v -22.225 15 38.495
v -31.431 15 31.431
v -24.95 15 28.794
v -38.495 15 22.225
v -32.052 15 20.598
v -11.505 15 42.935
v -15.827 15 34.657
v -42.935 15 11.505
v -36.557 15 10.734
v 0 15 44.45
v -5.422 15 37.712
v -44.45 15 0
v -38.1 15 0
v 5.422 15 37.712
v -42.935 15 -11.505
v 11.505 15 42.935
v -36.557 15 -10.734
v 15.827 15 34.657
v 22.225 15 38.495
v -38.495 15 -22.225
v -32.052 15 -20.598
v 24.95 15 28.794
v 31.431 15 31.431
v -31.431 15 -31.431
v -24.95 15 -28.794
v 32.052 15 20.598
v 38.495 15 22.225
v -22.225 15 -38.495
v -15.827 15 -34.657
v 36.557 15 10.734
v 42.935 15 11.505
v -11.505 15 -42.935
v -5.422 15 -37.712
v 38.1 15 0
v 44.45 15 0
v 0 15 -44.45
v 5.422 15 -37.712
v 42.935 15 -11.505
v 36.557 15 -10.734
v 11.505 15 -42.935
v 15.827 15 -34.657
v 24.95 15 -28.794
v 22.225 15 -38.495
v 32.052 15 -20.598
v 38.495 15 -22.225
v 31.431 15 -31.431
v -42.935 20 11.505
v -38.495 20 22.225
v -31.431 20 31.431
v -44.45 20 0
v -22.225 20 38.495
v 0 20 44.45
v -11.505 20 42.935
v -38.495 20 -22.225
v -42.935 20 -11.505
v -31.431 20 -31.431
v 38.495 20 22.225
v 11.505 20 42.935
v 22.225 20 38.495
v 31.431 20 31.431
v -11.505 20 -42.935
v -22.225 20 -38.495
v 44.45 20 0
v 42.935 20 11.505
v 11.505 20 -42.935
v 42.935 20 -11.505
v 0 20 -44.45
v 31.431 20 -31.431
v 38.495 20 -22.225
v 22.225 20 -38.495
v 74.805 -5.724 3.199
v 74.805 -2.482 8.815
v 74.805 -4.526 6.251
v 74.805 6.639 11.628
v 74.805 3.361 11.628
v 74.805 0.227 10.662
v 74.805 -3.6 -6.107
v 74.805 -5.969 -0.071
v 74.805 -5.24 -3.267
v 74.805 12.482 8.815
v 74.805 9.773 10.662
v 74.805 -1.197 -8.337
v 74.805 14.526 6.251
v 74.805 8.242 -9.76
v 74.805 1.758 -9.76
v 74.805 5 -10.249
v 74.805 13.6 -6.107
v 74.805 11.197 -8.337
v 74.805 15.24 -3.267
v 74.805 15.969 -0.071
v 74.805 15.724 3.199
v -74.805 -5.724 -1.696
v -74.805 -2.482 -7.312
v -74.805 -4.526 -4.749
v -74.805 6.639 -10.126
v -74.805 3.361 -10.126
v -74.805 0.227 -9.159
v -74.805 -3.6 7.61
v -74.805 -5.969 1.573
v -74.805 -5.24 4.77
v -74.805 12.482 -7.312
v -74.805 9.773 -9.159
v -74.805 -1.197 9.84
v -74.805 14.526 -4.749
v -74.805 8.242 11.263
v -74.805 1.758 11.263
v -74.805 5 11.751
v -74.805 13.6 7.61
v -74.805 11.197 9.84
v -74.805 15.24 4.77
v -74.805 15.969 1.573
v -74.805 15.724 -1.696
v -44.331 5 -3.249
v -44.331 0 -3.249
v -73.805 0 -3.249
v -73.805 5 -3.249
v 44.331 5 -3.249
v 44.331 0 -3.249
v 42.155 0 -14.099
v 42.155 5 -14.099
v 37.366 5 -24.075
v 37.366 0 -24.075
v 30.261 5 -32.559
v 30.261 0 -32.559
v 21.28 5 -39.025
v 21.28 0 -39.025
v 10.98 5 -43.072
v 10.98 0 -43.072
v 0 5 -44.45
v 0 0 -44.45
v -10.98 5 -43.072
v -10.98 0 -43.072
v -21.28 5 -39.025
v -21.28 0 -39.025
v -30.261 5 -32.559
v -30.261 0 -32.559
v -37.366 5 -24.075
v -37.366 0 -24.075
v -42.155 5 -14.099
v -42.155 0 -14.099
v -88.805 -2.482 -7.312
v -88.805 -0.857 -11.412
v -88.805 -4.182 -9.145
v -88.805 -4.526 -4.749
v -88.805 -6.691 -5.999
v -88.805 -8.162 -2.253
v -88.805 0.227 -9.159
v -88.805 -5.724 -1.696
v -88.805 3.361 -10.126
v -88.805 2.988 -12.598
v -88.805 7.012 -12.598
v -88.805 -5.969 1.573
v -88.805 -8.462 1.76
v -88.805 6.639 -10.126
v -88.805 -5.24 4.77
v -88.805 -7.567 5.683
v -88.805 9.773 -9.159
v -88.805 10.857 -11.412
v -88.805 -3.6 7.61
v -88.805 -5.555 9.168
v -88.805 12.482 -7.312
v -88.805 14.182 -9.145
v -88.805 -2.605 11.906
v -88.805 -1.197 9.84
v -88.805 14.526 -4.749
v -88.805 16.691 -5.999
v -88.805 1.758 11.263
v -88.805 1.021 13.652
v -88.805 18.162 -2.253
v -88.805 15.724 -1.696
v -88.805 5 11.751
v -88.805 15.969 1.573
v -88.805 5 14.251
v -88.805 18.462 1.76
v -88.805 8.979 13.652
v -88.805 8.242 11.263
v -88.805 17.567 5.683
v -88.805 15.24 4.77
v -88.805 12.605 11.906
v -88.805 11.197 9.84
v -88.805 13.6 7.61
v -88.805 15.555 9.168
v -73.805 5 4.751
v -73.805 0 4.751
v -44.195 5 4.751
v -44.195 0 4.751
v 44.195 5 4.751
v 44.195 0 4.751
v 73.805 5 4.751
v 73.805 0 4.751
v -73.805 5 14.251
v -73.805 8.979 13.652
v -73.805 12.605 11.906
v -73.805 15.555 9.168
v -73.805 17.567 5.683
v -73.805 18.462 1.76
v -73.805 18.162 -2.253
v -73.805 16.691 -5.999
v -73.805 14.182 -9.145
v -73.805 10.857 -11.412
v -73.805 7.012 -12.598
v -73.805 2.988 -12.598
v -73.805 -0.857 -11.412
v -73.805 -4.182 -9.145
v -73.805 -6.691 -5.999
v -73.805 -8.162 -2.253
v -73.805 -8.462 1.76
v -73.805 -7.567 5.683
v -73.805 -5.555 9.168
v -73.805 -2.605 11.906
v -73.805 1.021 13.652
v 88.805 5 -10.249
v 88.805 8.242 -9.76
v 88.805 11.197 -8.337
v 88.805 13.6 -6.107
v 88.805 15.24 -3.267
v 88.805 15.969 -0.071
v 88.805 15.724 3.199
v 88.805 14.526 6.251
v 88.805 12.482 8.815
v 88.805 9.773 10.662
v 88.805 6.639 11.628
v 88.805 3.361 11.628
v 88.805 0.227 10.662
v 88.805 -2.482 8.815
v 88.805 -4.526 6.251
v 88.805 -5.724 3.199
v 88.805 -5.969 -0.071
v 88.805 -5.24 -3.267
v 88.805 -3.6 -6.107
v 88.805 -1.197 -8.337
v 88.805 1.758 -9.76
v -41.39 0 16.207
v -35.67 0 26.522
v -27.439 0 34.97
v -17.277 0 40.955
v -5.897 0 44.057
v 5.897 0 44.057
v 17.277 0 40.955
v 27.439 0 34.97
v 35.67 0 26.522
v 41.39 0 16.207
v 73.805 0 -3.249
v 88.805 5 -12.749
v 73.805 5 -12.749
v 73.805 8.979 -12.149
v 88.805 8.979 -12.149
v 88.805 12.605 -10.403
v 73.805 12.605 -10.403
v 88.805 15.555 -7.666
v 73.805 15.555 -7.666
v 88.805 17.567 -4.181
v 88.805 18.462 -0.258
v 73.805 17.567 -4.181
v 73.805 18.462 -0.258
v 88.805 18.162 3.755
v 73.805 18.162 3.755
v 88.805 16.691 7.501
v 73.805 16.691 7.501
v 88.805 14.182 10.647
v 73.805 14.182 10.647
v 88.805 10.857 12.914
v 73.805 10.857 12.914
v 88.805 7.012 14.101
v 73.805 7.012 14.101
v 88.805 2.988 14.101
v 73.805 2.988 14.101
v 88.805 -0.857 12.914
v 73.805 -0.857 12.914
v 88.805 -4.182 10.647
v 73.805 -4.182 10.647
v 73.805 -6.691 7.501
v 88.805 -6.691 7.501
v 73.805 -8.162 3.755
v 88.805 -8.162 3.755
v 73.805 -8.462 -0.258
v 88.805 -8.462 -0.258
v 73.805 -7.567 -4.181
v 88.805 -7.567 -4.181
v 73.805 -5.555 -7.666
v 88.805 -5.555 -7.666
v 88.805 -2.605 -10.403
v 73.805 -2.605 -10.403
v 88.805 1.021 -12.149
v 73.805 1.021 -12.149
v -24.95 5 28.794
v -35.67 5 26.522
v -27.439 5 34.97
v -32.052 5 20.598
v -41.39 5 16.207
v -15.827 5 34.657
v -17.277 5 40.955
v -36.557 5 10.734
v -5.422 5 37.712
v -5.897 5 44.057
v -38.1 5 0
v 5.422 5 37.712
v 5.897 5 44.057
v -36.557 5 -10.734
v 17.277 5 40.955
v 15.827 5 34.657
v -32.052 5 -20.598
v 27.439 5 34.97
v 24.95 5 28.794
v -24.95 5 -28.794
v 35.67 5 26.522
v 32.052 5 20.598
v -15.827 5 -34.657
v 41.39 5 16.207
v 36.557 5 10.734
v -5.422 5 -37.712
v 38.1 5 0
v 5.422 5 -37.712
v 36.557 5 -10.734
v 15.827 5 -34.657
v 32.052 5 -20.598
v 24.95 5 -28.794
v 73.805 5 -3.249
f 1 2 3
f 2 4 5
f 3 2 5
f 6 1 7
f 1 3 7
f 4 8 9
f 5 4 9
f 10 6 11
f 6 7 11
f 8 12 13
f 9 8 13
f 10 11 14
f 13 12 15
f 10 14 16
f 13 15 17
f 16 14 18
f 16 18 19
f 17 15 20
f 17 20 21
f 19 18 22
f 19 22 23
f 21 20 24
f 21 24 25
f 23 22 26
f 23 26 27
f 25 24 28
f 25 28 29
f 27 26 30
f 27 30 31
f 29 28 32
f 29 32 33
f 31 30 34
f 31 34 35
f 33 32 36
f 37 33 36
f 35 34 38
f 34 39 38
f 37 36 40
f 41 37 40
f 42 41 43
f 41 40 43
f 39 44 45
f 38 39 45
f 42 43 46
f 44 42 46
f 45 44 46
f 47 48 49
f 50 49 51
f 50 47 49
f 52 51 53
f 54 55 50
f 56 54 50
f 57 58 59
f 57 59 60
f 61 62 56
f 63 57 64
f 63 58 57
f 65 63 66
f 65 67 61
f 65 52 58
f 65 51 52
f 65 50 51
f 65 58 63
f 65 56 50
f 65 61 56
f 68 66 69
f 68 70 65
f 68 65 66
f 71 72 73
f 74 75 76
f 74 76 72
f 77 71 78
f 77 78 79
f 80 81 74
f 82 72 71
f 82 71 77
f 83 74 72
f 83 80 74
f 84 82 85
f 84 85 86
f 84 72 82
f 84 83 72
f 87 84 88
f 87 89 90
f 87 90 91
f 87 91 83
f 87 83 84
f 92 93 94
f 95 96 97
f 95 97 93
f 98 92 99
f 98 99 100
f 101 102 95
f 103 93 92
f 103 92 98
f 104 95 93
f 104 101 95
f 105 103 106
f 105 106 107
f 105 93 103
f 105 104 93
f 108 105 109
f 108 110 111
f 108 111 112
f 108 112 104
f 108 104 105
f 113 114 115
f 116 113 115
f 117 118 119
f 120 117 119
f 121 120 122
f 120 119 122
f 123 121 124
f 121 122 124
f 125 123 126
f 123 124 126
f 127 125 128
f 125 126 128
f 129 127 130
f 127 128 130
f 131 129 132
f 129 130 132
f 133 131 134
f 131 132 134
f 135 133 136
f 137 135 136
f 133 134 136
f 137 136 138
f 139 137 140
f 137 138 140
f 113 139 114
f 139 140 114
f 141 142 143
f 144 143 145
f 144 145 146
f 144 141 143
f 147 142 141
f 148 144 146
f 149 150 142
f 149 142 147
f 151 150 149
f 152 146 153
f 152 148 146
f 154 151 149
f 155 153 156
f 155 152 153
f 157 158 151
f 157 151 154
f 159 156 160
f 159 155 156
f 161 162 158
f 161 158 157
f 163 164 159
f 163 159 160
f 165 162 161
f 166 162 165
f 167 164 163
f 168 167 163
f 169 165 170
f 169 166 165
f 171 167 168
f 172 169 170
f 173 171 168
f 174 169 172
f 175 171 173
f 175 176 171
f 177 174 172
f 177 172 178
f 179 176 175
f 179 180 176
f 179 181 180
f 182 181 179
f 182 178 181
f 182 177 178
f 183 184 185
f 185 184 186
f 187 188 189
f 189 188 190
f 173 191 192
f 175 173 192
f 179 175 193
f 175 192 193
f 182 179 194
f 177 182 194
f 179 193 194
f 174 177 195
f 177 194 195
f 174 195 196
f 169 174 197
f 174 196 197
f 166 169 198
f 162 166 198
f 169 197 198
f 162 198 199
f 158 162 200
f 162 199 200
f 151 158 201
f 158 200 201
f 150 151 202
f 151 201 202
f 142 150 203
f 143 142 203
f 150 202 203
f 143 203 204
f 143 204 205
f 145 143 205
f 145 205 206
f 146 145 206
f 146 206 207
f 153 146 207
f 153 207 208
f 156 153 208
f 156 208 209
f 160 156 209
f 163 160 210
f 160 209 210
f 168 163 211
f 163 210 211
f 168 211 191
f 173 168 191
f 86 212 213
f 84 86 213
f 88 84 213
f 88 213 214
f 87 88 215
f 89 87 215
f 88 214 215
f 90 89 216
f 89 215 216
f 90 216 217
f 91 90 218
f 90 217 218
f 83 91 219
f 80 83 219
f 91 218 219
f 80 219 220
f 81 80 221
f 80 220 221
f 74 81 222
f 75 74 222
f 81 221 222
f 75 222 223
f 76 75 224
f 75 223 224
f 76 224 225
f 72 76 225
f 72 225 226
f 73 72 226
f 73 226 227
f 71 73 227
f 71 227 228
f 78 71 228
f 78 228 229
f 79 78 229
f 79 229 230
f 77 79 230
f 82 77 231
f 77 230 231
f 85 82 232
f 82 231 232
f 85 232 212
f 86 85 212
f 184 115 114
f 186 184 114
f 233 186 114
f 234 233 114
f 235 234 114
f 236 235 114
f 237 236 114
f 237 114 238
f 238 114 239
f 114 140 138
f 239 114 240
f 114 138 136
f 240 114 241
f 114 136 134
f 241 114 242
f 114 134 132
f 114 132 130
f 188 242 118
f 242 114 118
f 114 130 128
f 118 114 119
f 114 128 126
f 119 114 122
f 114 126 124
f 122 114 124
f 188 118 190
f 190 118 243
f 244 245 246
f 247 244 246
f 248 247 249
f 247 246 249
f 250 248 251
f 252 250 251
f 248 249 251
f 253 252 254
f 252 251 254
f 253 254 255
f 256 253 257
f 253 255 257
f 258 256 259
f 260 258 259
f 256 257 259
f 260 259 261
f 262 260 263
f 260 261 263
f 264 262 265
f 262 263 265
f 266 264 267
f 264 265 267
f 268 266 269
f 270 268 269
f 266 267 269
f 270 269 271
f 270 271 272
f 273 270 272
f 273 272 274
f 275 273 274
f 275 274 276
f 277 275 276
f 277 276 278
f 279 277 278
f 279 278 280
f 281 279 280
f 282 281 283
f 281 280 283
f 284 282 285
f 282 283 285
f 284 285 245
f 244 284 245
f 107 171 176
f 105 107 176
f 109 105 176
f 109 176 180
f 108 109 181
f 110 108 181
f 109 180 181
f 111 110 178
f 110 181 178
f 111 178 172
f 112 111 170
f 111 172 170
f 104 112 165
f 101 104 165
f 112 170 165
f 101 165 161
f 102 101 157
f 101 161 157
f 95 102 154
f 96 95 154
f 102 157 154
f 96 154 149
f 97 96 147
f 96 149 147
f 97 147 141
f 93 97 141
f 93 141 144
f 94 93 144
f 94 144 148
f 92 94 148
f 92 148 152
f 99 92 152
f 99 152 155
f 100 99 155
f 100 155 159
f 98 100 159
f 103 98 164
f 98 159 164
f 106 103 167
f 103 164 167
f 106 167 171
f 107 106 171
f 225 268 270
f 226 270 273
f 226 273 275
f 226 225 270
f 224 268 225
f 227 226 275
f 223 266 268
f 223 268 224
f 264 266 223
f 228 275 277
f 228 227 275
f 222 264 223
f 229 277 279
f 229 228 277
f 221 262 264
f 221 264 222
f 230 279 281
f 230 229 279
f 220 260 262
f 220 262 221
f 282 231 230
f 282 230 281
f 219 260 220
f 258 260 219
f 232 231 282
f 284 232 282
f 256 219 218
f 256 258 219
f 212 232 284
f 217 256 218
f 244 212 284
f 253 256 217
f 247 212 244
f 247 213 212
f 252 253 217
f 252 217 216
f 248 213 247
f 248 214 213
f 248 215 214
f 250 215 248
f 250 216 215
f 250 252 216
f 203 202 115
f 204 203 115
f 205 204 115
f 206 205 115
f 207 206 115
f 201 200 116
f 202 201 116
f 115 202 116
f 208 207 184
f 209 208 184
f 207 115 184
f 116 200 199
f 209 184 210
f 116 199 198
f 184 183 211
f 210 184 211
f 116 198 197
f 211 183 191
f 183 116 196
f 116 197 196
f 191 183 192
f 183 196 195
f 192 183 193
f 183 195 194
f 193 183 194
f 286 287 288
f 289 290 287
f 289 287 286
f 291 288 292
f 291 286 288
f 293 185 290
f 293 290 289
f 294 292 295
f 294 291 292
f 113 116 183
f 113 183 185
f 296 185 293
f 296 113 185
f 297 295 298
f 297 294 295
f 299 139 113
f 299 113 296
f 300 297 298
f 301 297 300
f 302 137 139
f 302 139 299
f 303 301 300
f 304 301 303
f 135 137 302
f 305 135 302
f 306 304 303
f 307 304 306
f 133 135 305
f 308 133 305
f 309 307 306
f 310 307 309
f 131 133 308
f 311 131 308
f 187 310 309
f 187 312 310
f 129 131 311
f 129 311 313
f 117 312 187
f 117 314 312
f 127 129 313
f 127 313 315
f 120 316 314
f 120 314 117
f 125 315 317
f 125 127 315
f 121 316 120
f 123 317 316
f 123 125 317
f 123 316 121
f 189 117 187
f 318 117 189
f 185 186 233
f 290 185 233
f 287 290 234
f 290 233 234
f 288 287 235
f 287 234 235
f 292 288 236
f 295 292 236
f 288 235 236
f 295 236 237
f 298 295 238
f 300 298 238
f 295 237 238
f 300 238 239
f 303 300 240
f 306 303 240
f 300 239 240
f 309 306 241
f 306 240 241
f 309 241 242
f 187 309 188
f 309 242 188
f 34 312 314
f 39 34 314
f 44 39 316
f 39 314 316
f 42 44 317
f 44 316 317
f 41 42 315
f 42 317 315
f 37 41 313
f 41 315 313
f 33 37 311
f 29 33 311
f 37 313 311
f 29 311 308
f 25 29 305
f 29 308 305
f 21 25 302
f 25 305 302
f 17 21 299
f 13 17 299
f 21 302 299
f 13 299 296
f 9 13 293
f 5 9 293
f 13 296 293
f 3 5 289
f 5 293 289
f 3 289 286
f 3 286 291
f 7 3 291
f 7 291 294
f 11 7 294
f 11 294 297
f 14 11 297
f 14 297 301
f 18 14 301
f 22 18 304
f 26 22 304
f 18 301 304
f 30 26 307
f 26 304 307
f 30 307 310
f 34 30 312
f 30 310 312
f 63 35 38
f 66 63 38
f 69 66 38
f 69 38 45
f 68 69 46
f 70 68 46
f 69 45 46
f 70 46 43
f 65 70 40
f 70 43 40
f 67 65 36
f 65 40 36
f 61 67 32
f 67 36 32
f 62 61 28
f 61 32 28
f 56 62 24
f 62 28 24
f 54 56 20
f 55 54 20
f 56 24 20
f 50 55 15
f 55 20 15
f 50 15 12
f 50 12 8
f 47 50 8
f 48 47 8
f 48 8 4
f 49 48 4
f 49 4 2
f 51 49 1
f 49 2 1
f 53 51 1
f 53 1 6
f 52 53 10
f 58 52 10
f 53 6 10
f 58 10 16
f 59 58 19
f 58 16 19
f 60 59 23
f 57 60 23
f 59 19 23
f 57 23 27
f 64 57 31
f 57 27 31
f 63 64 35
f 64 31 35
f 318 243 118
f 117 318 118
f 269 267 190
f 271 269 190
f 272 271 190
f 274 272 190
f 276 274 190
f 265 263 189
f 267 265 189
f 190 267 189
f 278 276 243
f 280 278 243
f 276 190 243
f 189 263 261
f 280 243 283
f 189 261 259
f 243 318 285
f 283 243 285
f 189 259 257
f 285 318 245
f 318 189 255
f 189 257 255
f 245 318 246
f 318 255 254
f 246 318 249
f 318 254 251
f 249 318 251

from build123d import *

# Parameters (mm, degrees)
SKETCH1_R           = 44.45
BOSS_EXTRUDE1_DEPTH = 5
SKETCH2_R           = 38.1
BOSS_EXTRUDE2_DEPTH = 10
SKETCH3_R           = 44.45
BOSS_EXTRUDE3_DEPTH = 5
BOSS_EXTRUDE4_DEPTH = 5
SKETCH5_R           = 13.5
BOSS_EXTRUDE5_DEPTH = 15
SKETCH6_R           = 13.5
BOSS_EXTRUDE6_DEPTH = 15
SKETCH7_R           = 11
CUT_EXTRUDE1_DEPTH  = 14
SKETCH8_R           = 11
CUT_EXTRUDE2_DEPTH  = 14


with BuildPart() as part:
    # Sketch1 → Boss-Extrude1 (new body)
    with BuildSketch(Plane(origin=(0, 0, 0), x_dir=(1, 0, 0), z_dir=(0, 1, 0))):
        Circle(SKETCH1_R)
    extrude(amount=BOSS_EXTRUDE1_DEPTH)

    # Sketch2 → Boss-Extrude2 (add)
    with BuildSketch(Plane(origin=(0, 5, 0), x_dir=(1, 0, 0), z_dir=(0, 1, 0))):
        Circle(SKETCH2_R)
    extrude(amount=BOSS_EXTRUDE2_DEPTH)

    # Sketch3 → Boss-Extrude3 (add)
    with BuildSketch(Plane(origin=(0, 15, 0), x_dir=(1, 0, 0), z_dir=(0, 1, 0))):
        Circle(SKETCH3_R)
    extrude(amount=BOSS_EXTRUDE3_DEPTH)

    # Sketch4 → Boss-Extrude4 (add)
    with BuildSketch(Plane(origin=(0, 0, 0), x_dir=(1, 0, 0), z_dir=(0, 1, 0))):
        with BuildLine():
            ThreePointArc((-44.195335285, -4.751298672), (-44.443598423, -0.75436016), (-44.331122698, 3.248701328))
            Line((-44.331122698, 3.248701328), (-73.805449313, 3.248701328))
            Line((-73.805449313, 3.248701328), (-73.805449313, -4.751298672))
            Line((-73.805449313, -4.751298672), (-44.195335285, -4.751298672))
        make_face()
        with BuildLine():
            Line((73.805449313, 3.248701328), (44.331122698, 3.248701328))
            ThreePointArc((44.331122698, 3.248701328), (44.420270733, 1.625437797), (44.45, 0))
            ThreePointArc((44.45, 0), (44.386288161, -2.37905933), (44.195335285, -4.751298672))
            Line((44.195335285, -4.751298672), (73.805449313, -4.751298672))
            Line((73.805449313, -4.751298672), (73.805449313, 3.248701328))
        make_face()
    extrude(amount=BOSS_EXTRUDE4_DEPTH)

    # Sketch5 → Boss-Extrude5 (add)
    with BuildSketch(Plane.ZY.offset(73.805449313)):
        with Locations((0.751298672, 5)):
            Circle(SKETCH5_R)
    extrude(amount=BOSS_EXTRUDE5_DEPTH)

    # Sketch6 → Boss-Extrude6 (add)
    with BuildSketch(Plane(origin=(73.805449313, 0, 0), x_dir=(0, 0, -1), z_dir=(1, 0, 0))):
        with Locations((-0.751298672, 5)):
            Circle(SKETCH6_R)
    extrude(amount=BOSS_EXTRUDE6_DEPTH)

    # Sketch7 → Cut-Extrude1 (cut)
    with BuildSketch(Plane(origin=(88.805449313, 0, 0), x_dir=(0, 0, -1), z_dir=(1, 0, 0))):
        with Locations((-0.751298672, 5)):
            Circle(SKETCH7_R)
    extrude(amount=-CUT_EXTRUDE1_DEPTH, mode=Mode.SUBTRACT)

    # Sketch8 → Cut-Extrude2 (cut)
    with BuildSketch(Plane.ZY.offset(88.805449313)):
        with Locations((0.751298672, 5)):
            Circle(SKETCH8_R)
    extrude(amount=-CUT_EXTRUDE2_DEPTH, mode=Mode.SUBTRACT)


solid = part.part
